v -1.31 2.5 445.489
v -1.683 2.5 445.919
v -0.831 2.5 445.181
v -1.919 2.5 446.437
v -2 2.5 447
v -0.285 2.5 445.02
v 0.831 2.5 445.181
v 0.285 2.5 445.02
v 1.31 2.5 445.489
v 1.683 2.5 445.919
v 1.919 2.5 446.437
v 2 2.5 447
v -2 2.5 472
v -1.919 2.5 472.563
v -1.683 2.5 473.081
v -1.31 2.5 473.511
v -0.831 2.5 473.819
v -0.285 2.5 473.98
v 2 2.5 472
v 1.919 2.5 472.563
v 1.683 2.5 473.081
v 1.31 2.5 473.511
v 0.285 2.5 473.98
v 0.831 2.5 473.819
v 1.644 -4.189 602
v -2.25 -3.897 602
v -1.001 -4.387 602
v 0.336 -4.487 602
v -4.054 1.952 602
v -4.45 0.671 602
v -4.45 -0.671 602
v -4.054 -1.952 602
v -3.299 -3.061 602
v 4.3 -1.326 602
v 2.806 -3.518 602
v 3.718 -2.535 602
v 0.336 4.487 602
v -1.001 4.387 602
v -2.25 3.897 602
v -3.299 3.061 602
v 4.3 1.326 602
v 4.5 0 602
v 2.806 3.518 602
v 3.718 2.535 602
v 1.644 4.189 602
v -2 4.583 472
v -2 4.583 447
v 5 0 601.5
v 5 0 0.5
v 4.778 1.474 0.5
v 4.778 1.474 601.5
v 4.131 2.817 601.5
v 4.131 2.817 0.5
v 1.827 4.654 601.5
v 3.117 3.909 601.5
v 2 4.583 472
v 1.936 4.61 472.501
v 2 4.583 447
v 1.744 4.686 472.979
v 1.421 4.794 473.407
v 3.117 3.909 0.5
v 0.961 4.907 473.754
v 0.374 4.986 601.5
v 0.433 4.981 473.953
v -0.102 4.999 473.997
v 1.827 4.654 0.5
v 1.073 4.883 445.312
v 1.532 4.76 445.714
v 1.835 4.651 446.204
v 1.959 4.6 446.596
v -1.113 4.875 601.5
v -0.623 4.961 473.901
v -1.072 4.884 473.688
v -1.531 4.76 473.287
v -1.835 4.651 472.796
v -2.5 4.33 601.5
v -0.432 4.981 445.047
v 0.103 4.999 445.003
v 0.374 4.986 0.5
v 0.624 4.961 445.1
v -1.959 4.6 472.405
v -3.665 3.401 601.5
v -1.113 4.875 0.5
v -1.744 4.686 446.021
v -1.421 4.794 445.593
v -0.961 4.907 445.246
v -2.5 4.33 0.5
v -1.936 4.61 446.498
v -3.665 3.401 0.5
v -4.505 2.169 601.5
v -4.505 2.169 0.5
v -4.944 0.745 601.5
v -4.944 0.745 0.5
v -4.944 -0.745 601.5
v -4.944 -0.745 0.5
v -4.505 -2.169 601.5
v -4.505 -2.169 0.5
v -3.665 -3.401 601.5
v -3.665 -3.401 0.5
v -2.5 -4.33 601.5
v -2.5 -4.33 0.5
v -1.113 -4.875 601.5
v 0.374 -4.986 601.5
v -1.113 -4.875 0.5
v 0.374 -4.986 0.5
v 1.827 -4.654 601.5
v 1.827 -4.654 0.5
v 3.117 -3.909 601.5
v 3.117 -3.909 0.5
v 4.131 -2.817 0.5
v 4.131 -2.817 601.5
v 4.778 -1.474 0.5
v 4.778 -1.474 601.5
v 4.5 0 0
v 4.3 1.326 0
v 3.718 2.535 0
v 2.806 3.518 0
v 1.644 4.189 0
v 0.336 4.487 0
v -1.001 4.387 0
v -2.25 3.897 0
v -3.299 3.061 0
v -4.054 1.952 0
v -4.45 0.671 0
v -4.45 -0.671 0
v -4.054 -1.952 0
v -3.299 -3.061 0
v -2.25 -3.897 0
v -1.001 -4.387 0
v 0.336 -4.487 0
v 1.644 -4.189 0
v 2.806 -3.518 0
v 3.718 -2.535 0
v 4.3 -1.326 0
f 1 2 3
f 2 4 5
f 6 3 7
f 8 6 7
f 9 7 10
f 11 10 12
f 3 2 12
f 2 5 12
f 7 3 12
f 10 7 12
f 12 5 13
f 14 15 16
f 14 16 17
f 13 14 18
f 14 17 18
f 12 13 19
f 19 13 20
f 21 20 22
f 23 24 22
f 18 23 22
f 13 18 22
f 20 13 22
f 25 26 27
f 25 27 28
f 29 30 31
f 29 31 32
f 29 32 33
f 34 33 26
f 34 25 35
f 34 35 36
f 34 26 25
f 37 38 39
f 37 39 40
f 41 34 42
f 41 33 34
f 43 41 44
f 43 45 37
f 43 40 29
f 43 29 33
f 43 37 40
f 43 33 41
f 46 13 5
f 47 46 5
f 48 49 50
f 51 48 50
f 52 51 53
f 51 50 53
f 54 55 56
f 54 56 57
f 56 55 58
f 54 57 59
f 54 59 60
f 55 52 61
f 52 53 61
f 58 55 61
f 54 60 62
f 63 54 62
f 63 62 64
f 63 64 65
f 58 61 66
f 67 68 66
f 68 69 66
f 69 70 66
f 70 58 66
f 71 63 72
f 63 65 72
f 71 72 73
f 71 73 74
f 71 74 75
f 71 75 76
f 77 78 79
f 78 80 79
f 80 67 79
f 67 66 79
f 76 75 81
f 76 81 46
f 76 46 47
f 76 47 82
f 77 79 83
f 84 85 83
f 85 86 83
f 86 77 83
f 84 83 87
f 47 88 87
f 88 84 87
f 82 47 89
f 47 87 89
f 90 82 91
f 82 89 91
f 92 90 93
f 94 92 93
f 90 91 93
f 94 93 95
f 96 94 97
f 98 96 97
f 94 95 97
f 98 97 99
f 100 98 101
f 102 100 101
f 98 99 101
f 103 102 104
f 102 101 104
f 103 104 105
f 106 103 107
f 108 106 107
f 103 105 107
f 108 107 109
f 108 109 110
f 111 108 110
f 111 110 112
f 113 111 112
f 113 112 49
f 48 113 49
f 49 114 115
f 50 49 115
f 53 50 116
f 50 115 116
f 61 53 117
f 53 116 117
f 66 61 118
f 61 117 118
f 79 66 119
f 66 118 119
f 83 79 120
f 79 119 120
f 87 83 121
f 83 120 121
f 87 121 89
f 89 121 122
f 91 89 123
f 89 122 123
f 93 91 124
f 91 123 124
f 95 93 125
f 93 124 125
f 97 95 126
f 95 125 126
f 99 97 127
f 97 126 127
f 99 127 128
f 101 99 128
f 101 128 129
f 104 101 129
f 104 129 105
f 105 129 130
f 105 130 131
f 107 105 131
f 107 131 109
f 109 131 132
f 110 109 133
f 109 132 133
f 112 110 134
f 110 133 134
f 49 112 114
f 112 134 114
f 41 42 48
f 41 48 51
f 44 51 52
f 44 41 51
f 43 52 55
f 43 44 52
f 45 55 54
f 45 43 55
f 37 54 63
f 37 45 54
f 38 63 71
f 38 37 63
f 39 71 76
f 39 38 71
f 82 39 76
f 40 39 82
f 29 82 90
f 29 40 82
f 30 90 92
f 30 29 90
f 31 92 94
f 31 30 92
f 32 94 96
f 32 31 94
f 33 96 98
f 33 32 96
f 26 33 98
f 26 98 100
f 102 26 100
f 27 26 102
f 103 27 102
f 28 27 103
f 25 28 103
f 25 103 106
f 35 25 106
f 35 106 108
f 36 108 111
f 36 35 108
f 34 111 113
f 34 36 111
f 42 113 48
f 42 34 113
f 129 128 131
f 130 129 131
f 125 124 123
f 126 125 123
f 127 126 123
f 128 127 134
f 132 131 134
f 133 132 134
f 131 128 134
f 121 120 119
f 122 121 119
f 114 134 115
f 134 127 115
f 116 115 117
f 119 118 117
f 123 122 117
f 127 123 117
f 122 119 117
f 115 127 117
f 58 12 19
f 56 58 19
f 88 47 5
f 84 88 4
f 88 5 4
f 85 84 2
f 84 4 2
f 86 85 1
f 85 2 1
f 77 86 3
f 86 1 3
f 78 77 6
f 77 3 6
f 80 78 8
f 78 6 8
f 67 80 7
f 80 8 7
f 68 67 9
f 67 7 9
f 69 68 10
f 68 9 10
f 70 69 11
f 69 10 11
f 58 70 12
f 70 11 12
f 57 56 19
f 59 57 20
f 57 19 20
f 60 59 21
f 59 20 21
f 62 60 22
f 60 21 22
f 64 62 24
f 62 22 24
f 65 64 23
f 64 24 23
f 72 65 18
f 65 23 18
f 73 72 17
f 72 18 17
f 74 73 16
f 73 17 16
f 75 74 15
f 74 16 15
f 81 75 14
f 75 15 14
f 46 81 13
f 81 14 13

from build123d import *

# Parameters (mm, degrees)
SKETCH_1_R          = 5
EXTRUDE_1_DEPTH     = 602
CHAMFER_1_SIZE      = 0.5
CUT_EXTRUDE_2_DEPTH = 10


with BuildPart() as part:
    # 草图1 → 拉伸1 (new body)
    with BuildSketch(Plane.XY):
        Circle(SKETCH_1_R)
    extrude(amount=EXTRUDE_1_DEPTH)

    # 倒角1
    chamfer_1_edges = [part.edges().sort_by_distance(p)[0] for p in [
        (-5, 0, 0),
        (-5, 0, 602),
    ]]
    chamfer(chamfer_1_edges, length=CHAMFER_1_SIZE)

    # 草图2 → 拉伸2 (cut)
    with BuildSketch(Plane(origin=(0, 2.5, 0), x_dir=(-1, 0, 0), z_dir=(0, 1, 0))):
        with BuildLine():
            Line((2, 472), (2, 447))
            ThreePointArc((2, 447), (0, 445), (-2, 447))
            Line((-2, 447), (-2, 472))
            ThreePointArc((-2, 472), (0, 474), (2, 472))
        make_face()
    extrude(amount=CUT_EXTRUDE_2_DEPTH, mode=Mode.SUBTRACT)


solid = part.part
